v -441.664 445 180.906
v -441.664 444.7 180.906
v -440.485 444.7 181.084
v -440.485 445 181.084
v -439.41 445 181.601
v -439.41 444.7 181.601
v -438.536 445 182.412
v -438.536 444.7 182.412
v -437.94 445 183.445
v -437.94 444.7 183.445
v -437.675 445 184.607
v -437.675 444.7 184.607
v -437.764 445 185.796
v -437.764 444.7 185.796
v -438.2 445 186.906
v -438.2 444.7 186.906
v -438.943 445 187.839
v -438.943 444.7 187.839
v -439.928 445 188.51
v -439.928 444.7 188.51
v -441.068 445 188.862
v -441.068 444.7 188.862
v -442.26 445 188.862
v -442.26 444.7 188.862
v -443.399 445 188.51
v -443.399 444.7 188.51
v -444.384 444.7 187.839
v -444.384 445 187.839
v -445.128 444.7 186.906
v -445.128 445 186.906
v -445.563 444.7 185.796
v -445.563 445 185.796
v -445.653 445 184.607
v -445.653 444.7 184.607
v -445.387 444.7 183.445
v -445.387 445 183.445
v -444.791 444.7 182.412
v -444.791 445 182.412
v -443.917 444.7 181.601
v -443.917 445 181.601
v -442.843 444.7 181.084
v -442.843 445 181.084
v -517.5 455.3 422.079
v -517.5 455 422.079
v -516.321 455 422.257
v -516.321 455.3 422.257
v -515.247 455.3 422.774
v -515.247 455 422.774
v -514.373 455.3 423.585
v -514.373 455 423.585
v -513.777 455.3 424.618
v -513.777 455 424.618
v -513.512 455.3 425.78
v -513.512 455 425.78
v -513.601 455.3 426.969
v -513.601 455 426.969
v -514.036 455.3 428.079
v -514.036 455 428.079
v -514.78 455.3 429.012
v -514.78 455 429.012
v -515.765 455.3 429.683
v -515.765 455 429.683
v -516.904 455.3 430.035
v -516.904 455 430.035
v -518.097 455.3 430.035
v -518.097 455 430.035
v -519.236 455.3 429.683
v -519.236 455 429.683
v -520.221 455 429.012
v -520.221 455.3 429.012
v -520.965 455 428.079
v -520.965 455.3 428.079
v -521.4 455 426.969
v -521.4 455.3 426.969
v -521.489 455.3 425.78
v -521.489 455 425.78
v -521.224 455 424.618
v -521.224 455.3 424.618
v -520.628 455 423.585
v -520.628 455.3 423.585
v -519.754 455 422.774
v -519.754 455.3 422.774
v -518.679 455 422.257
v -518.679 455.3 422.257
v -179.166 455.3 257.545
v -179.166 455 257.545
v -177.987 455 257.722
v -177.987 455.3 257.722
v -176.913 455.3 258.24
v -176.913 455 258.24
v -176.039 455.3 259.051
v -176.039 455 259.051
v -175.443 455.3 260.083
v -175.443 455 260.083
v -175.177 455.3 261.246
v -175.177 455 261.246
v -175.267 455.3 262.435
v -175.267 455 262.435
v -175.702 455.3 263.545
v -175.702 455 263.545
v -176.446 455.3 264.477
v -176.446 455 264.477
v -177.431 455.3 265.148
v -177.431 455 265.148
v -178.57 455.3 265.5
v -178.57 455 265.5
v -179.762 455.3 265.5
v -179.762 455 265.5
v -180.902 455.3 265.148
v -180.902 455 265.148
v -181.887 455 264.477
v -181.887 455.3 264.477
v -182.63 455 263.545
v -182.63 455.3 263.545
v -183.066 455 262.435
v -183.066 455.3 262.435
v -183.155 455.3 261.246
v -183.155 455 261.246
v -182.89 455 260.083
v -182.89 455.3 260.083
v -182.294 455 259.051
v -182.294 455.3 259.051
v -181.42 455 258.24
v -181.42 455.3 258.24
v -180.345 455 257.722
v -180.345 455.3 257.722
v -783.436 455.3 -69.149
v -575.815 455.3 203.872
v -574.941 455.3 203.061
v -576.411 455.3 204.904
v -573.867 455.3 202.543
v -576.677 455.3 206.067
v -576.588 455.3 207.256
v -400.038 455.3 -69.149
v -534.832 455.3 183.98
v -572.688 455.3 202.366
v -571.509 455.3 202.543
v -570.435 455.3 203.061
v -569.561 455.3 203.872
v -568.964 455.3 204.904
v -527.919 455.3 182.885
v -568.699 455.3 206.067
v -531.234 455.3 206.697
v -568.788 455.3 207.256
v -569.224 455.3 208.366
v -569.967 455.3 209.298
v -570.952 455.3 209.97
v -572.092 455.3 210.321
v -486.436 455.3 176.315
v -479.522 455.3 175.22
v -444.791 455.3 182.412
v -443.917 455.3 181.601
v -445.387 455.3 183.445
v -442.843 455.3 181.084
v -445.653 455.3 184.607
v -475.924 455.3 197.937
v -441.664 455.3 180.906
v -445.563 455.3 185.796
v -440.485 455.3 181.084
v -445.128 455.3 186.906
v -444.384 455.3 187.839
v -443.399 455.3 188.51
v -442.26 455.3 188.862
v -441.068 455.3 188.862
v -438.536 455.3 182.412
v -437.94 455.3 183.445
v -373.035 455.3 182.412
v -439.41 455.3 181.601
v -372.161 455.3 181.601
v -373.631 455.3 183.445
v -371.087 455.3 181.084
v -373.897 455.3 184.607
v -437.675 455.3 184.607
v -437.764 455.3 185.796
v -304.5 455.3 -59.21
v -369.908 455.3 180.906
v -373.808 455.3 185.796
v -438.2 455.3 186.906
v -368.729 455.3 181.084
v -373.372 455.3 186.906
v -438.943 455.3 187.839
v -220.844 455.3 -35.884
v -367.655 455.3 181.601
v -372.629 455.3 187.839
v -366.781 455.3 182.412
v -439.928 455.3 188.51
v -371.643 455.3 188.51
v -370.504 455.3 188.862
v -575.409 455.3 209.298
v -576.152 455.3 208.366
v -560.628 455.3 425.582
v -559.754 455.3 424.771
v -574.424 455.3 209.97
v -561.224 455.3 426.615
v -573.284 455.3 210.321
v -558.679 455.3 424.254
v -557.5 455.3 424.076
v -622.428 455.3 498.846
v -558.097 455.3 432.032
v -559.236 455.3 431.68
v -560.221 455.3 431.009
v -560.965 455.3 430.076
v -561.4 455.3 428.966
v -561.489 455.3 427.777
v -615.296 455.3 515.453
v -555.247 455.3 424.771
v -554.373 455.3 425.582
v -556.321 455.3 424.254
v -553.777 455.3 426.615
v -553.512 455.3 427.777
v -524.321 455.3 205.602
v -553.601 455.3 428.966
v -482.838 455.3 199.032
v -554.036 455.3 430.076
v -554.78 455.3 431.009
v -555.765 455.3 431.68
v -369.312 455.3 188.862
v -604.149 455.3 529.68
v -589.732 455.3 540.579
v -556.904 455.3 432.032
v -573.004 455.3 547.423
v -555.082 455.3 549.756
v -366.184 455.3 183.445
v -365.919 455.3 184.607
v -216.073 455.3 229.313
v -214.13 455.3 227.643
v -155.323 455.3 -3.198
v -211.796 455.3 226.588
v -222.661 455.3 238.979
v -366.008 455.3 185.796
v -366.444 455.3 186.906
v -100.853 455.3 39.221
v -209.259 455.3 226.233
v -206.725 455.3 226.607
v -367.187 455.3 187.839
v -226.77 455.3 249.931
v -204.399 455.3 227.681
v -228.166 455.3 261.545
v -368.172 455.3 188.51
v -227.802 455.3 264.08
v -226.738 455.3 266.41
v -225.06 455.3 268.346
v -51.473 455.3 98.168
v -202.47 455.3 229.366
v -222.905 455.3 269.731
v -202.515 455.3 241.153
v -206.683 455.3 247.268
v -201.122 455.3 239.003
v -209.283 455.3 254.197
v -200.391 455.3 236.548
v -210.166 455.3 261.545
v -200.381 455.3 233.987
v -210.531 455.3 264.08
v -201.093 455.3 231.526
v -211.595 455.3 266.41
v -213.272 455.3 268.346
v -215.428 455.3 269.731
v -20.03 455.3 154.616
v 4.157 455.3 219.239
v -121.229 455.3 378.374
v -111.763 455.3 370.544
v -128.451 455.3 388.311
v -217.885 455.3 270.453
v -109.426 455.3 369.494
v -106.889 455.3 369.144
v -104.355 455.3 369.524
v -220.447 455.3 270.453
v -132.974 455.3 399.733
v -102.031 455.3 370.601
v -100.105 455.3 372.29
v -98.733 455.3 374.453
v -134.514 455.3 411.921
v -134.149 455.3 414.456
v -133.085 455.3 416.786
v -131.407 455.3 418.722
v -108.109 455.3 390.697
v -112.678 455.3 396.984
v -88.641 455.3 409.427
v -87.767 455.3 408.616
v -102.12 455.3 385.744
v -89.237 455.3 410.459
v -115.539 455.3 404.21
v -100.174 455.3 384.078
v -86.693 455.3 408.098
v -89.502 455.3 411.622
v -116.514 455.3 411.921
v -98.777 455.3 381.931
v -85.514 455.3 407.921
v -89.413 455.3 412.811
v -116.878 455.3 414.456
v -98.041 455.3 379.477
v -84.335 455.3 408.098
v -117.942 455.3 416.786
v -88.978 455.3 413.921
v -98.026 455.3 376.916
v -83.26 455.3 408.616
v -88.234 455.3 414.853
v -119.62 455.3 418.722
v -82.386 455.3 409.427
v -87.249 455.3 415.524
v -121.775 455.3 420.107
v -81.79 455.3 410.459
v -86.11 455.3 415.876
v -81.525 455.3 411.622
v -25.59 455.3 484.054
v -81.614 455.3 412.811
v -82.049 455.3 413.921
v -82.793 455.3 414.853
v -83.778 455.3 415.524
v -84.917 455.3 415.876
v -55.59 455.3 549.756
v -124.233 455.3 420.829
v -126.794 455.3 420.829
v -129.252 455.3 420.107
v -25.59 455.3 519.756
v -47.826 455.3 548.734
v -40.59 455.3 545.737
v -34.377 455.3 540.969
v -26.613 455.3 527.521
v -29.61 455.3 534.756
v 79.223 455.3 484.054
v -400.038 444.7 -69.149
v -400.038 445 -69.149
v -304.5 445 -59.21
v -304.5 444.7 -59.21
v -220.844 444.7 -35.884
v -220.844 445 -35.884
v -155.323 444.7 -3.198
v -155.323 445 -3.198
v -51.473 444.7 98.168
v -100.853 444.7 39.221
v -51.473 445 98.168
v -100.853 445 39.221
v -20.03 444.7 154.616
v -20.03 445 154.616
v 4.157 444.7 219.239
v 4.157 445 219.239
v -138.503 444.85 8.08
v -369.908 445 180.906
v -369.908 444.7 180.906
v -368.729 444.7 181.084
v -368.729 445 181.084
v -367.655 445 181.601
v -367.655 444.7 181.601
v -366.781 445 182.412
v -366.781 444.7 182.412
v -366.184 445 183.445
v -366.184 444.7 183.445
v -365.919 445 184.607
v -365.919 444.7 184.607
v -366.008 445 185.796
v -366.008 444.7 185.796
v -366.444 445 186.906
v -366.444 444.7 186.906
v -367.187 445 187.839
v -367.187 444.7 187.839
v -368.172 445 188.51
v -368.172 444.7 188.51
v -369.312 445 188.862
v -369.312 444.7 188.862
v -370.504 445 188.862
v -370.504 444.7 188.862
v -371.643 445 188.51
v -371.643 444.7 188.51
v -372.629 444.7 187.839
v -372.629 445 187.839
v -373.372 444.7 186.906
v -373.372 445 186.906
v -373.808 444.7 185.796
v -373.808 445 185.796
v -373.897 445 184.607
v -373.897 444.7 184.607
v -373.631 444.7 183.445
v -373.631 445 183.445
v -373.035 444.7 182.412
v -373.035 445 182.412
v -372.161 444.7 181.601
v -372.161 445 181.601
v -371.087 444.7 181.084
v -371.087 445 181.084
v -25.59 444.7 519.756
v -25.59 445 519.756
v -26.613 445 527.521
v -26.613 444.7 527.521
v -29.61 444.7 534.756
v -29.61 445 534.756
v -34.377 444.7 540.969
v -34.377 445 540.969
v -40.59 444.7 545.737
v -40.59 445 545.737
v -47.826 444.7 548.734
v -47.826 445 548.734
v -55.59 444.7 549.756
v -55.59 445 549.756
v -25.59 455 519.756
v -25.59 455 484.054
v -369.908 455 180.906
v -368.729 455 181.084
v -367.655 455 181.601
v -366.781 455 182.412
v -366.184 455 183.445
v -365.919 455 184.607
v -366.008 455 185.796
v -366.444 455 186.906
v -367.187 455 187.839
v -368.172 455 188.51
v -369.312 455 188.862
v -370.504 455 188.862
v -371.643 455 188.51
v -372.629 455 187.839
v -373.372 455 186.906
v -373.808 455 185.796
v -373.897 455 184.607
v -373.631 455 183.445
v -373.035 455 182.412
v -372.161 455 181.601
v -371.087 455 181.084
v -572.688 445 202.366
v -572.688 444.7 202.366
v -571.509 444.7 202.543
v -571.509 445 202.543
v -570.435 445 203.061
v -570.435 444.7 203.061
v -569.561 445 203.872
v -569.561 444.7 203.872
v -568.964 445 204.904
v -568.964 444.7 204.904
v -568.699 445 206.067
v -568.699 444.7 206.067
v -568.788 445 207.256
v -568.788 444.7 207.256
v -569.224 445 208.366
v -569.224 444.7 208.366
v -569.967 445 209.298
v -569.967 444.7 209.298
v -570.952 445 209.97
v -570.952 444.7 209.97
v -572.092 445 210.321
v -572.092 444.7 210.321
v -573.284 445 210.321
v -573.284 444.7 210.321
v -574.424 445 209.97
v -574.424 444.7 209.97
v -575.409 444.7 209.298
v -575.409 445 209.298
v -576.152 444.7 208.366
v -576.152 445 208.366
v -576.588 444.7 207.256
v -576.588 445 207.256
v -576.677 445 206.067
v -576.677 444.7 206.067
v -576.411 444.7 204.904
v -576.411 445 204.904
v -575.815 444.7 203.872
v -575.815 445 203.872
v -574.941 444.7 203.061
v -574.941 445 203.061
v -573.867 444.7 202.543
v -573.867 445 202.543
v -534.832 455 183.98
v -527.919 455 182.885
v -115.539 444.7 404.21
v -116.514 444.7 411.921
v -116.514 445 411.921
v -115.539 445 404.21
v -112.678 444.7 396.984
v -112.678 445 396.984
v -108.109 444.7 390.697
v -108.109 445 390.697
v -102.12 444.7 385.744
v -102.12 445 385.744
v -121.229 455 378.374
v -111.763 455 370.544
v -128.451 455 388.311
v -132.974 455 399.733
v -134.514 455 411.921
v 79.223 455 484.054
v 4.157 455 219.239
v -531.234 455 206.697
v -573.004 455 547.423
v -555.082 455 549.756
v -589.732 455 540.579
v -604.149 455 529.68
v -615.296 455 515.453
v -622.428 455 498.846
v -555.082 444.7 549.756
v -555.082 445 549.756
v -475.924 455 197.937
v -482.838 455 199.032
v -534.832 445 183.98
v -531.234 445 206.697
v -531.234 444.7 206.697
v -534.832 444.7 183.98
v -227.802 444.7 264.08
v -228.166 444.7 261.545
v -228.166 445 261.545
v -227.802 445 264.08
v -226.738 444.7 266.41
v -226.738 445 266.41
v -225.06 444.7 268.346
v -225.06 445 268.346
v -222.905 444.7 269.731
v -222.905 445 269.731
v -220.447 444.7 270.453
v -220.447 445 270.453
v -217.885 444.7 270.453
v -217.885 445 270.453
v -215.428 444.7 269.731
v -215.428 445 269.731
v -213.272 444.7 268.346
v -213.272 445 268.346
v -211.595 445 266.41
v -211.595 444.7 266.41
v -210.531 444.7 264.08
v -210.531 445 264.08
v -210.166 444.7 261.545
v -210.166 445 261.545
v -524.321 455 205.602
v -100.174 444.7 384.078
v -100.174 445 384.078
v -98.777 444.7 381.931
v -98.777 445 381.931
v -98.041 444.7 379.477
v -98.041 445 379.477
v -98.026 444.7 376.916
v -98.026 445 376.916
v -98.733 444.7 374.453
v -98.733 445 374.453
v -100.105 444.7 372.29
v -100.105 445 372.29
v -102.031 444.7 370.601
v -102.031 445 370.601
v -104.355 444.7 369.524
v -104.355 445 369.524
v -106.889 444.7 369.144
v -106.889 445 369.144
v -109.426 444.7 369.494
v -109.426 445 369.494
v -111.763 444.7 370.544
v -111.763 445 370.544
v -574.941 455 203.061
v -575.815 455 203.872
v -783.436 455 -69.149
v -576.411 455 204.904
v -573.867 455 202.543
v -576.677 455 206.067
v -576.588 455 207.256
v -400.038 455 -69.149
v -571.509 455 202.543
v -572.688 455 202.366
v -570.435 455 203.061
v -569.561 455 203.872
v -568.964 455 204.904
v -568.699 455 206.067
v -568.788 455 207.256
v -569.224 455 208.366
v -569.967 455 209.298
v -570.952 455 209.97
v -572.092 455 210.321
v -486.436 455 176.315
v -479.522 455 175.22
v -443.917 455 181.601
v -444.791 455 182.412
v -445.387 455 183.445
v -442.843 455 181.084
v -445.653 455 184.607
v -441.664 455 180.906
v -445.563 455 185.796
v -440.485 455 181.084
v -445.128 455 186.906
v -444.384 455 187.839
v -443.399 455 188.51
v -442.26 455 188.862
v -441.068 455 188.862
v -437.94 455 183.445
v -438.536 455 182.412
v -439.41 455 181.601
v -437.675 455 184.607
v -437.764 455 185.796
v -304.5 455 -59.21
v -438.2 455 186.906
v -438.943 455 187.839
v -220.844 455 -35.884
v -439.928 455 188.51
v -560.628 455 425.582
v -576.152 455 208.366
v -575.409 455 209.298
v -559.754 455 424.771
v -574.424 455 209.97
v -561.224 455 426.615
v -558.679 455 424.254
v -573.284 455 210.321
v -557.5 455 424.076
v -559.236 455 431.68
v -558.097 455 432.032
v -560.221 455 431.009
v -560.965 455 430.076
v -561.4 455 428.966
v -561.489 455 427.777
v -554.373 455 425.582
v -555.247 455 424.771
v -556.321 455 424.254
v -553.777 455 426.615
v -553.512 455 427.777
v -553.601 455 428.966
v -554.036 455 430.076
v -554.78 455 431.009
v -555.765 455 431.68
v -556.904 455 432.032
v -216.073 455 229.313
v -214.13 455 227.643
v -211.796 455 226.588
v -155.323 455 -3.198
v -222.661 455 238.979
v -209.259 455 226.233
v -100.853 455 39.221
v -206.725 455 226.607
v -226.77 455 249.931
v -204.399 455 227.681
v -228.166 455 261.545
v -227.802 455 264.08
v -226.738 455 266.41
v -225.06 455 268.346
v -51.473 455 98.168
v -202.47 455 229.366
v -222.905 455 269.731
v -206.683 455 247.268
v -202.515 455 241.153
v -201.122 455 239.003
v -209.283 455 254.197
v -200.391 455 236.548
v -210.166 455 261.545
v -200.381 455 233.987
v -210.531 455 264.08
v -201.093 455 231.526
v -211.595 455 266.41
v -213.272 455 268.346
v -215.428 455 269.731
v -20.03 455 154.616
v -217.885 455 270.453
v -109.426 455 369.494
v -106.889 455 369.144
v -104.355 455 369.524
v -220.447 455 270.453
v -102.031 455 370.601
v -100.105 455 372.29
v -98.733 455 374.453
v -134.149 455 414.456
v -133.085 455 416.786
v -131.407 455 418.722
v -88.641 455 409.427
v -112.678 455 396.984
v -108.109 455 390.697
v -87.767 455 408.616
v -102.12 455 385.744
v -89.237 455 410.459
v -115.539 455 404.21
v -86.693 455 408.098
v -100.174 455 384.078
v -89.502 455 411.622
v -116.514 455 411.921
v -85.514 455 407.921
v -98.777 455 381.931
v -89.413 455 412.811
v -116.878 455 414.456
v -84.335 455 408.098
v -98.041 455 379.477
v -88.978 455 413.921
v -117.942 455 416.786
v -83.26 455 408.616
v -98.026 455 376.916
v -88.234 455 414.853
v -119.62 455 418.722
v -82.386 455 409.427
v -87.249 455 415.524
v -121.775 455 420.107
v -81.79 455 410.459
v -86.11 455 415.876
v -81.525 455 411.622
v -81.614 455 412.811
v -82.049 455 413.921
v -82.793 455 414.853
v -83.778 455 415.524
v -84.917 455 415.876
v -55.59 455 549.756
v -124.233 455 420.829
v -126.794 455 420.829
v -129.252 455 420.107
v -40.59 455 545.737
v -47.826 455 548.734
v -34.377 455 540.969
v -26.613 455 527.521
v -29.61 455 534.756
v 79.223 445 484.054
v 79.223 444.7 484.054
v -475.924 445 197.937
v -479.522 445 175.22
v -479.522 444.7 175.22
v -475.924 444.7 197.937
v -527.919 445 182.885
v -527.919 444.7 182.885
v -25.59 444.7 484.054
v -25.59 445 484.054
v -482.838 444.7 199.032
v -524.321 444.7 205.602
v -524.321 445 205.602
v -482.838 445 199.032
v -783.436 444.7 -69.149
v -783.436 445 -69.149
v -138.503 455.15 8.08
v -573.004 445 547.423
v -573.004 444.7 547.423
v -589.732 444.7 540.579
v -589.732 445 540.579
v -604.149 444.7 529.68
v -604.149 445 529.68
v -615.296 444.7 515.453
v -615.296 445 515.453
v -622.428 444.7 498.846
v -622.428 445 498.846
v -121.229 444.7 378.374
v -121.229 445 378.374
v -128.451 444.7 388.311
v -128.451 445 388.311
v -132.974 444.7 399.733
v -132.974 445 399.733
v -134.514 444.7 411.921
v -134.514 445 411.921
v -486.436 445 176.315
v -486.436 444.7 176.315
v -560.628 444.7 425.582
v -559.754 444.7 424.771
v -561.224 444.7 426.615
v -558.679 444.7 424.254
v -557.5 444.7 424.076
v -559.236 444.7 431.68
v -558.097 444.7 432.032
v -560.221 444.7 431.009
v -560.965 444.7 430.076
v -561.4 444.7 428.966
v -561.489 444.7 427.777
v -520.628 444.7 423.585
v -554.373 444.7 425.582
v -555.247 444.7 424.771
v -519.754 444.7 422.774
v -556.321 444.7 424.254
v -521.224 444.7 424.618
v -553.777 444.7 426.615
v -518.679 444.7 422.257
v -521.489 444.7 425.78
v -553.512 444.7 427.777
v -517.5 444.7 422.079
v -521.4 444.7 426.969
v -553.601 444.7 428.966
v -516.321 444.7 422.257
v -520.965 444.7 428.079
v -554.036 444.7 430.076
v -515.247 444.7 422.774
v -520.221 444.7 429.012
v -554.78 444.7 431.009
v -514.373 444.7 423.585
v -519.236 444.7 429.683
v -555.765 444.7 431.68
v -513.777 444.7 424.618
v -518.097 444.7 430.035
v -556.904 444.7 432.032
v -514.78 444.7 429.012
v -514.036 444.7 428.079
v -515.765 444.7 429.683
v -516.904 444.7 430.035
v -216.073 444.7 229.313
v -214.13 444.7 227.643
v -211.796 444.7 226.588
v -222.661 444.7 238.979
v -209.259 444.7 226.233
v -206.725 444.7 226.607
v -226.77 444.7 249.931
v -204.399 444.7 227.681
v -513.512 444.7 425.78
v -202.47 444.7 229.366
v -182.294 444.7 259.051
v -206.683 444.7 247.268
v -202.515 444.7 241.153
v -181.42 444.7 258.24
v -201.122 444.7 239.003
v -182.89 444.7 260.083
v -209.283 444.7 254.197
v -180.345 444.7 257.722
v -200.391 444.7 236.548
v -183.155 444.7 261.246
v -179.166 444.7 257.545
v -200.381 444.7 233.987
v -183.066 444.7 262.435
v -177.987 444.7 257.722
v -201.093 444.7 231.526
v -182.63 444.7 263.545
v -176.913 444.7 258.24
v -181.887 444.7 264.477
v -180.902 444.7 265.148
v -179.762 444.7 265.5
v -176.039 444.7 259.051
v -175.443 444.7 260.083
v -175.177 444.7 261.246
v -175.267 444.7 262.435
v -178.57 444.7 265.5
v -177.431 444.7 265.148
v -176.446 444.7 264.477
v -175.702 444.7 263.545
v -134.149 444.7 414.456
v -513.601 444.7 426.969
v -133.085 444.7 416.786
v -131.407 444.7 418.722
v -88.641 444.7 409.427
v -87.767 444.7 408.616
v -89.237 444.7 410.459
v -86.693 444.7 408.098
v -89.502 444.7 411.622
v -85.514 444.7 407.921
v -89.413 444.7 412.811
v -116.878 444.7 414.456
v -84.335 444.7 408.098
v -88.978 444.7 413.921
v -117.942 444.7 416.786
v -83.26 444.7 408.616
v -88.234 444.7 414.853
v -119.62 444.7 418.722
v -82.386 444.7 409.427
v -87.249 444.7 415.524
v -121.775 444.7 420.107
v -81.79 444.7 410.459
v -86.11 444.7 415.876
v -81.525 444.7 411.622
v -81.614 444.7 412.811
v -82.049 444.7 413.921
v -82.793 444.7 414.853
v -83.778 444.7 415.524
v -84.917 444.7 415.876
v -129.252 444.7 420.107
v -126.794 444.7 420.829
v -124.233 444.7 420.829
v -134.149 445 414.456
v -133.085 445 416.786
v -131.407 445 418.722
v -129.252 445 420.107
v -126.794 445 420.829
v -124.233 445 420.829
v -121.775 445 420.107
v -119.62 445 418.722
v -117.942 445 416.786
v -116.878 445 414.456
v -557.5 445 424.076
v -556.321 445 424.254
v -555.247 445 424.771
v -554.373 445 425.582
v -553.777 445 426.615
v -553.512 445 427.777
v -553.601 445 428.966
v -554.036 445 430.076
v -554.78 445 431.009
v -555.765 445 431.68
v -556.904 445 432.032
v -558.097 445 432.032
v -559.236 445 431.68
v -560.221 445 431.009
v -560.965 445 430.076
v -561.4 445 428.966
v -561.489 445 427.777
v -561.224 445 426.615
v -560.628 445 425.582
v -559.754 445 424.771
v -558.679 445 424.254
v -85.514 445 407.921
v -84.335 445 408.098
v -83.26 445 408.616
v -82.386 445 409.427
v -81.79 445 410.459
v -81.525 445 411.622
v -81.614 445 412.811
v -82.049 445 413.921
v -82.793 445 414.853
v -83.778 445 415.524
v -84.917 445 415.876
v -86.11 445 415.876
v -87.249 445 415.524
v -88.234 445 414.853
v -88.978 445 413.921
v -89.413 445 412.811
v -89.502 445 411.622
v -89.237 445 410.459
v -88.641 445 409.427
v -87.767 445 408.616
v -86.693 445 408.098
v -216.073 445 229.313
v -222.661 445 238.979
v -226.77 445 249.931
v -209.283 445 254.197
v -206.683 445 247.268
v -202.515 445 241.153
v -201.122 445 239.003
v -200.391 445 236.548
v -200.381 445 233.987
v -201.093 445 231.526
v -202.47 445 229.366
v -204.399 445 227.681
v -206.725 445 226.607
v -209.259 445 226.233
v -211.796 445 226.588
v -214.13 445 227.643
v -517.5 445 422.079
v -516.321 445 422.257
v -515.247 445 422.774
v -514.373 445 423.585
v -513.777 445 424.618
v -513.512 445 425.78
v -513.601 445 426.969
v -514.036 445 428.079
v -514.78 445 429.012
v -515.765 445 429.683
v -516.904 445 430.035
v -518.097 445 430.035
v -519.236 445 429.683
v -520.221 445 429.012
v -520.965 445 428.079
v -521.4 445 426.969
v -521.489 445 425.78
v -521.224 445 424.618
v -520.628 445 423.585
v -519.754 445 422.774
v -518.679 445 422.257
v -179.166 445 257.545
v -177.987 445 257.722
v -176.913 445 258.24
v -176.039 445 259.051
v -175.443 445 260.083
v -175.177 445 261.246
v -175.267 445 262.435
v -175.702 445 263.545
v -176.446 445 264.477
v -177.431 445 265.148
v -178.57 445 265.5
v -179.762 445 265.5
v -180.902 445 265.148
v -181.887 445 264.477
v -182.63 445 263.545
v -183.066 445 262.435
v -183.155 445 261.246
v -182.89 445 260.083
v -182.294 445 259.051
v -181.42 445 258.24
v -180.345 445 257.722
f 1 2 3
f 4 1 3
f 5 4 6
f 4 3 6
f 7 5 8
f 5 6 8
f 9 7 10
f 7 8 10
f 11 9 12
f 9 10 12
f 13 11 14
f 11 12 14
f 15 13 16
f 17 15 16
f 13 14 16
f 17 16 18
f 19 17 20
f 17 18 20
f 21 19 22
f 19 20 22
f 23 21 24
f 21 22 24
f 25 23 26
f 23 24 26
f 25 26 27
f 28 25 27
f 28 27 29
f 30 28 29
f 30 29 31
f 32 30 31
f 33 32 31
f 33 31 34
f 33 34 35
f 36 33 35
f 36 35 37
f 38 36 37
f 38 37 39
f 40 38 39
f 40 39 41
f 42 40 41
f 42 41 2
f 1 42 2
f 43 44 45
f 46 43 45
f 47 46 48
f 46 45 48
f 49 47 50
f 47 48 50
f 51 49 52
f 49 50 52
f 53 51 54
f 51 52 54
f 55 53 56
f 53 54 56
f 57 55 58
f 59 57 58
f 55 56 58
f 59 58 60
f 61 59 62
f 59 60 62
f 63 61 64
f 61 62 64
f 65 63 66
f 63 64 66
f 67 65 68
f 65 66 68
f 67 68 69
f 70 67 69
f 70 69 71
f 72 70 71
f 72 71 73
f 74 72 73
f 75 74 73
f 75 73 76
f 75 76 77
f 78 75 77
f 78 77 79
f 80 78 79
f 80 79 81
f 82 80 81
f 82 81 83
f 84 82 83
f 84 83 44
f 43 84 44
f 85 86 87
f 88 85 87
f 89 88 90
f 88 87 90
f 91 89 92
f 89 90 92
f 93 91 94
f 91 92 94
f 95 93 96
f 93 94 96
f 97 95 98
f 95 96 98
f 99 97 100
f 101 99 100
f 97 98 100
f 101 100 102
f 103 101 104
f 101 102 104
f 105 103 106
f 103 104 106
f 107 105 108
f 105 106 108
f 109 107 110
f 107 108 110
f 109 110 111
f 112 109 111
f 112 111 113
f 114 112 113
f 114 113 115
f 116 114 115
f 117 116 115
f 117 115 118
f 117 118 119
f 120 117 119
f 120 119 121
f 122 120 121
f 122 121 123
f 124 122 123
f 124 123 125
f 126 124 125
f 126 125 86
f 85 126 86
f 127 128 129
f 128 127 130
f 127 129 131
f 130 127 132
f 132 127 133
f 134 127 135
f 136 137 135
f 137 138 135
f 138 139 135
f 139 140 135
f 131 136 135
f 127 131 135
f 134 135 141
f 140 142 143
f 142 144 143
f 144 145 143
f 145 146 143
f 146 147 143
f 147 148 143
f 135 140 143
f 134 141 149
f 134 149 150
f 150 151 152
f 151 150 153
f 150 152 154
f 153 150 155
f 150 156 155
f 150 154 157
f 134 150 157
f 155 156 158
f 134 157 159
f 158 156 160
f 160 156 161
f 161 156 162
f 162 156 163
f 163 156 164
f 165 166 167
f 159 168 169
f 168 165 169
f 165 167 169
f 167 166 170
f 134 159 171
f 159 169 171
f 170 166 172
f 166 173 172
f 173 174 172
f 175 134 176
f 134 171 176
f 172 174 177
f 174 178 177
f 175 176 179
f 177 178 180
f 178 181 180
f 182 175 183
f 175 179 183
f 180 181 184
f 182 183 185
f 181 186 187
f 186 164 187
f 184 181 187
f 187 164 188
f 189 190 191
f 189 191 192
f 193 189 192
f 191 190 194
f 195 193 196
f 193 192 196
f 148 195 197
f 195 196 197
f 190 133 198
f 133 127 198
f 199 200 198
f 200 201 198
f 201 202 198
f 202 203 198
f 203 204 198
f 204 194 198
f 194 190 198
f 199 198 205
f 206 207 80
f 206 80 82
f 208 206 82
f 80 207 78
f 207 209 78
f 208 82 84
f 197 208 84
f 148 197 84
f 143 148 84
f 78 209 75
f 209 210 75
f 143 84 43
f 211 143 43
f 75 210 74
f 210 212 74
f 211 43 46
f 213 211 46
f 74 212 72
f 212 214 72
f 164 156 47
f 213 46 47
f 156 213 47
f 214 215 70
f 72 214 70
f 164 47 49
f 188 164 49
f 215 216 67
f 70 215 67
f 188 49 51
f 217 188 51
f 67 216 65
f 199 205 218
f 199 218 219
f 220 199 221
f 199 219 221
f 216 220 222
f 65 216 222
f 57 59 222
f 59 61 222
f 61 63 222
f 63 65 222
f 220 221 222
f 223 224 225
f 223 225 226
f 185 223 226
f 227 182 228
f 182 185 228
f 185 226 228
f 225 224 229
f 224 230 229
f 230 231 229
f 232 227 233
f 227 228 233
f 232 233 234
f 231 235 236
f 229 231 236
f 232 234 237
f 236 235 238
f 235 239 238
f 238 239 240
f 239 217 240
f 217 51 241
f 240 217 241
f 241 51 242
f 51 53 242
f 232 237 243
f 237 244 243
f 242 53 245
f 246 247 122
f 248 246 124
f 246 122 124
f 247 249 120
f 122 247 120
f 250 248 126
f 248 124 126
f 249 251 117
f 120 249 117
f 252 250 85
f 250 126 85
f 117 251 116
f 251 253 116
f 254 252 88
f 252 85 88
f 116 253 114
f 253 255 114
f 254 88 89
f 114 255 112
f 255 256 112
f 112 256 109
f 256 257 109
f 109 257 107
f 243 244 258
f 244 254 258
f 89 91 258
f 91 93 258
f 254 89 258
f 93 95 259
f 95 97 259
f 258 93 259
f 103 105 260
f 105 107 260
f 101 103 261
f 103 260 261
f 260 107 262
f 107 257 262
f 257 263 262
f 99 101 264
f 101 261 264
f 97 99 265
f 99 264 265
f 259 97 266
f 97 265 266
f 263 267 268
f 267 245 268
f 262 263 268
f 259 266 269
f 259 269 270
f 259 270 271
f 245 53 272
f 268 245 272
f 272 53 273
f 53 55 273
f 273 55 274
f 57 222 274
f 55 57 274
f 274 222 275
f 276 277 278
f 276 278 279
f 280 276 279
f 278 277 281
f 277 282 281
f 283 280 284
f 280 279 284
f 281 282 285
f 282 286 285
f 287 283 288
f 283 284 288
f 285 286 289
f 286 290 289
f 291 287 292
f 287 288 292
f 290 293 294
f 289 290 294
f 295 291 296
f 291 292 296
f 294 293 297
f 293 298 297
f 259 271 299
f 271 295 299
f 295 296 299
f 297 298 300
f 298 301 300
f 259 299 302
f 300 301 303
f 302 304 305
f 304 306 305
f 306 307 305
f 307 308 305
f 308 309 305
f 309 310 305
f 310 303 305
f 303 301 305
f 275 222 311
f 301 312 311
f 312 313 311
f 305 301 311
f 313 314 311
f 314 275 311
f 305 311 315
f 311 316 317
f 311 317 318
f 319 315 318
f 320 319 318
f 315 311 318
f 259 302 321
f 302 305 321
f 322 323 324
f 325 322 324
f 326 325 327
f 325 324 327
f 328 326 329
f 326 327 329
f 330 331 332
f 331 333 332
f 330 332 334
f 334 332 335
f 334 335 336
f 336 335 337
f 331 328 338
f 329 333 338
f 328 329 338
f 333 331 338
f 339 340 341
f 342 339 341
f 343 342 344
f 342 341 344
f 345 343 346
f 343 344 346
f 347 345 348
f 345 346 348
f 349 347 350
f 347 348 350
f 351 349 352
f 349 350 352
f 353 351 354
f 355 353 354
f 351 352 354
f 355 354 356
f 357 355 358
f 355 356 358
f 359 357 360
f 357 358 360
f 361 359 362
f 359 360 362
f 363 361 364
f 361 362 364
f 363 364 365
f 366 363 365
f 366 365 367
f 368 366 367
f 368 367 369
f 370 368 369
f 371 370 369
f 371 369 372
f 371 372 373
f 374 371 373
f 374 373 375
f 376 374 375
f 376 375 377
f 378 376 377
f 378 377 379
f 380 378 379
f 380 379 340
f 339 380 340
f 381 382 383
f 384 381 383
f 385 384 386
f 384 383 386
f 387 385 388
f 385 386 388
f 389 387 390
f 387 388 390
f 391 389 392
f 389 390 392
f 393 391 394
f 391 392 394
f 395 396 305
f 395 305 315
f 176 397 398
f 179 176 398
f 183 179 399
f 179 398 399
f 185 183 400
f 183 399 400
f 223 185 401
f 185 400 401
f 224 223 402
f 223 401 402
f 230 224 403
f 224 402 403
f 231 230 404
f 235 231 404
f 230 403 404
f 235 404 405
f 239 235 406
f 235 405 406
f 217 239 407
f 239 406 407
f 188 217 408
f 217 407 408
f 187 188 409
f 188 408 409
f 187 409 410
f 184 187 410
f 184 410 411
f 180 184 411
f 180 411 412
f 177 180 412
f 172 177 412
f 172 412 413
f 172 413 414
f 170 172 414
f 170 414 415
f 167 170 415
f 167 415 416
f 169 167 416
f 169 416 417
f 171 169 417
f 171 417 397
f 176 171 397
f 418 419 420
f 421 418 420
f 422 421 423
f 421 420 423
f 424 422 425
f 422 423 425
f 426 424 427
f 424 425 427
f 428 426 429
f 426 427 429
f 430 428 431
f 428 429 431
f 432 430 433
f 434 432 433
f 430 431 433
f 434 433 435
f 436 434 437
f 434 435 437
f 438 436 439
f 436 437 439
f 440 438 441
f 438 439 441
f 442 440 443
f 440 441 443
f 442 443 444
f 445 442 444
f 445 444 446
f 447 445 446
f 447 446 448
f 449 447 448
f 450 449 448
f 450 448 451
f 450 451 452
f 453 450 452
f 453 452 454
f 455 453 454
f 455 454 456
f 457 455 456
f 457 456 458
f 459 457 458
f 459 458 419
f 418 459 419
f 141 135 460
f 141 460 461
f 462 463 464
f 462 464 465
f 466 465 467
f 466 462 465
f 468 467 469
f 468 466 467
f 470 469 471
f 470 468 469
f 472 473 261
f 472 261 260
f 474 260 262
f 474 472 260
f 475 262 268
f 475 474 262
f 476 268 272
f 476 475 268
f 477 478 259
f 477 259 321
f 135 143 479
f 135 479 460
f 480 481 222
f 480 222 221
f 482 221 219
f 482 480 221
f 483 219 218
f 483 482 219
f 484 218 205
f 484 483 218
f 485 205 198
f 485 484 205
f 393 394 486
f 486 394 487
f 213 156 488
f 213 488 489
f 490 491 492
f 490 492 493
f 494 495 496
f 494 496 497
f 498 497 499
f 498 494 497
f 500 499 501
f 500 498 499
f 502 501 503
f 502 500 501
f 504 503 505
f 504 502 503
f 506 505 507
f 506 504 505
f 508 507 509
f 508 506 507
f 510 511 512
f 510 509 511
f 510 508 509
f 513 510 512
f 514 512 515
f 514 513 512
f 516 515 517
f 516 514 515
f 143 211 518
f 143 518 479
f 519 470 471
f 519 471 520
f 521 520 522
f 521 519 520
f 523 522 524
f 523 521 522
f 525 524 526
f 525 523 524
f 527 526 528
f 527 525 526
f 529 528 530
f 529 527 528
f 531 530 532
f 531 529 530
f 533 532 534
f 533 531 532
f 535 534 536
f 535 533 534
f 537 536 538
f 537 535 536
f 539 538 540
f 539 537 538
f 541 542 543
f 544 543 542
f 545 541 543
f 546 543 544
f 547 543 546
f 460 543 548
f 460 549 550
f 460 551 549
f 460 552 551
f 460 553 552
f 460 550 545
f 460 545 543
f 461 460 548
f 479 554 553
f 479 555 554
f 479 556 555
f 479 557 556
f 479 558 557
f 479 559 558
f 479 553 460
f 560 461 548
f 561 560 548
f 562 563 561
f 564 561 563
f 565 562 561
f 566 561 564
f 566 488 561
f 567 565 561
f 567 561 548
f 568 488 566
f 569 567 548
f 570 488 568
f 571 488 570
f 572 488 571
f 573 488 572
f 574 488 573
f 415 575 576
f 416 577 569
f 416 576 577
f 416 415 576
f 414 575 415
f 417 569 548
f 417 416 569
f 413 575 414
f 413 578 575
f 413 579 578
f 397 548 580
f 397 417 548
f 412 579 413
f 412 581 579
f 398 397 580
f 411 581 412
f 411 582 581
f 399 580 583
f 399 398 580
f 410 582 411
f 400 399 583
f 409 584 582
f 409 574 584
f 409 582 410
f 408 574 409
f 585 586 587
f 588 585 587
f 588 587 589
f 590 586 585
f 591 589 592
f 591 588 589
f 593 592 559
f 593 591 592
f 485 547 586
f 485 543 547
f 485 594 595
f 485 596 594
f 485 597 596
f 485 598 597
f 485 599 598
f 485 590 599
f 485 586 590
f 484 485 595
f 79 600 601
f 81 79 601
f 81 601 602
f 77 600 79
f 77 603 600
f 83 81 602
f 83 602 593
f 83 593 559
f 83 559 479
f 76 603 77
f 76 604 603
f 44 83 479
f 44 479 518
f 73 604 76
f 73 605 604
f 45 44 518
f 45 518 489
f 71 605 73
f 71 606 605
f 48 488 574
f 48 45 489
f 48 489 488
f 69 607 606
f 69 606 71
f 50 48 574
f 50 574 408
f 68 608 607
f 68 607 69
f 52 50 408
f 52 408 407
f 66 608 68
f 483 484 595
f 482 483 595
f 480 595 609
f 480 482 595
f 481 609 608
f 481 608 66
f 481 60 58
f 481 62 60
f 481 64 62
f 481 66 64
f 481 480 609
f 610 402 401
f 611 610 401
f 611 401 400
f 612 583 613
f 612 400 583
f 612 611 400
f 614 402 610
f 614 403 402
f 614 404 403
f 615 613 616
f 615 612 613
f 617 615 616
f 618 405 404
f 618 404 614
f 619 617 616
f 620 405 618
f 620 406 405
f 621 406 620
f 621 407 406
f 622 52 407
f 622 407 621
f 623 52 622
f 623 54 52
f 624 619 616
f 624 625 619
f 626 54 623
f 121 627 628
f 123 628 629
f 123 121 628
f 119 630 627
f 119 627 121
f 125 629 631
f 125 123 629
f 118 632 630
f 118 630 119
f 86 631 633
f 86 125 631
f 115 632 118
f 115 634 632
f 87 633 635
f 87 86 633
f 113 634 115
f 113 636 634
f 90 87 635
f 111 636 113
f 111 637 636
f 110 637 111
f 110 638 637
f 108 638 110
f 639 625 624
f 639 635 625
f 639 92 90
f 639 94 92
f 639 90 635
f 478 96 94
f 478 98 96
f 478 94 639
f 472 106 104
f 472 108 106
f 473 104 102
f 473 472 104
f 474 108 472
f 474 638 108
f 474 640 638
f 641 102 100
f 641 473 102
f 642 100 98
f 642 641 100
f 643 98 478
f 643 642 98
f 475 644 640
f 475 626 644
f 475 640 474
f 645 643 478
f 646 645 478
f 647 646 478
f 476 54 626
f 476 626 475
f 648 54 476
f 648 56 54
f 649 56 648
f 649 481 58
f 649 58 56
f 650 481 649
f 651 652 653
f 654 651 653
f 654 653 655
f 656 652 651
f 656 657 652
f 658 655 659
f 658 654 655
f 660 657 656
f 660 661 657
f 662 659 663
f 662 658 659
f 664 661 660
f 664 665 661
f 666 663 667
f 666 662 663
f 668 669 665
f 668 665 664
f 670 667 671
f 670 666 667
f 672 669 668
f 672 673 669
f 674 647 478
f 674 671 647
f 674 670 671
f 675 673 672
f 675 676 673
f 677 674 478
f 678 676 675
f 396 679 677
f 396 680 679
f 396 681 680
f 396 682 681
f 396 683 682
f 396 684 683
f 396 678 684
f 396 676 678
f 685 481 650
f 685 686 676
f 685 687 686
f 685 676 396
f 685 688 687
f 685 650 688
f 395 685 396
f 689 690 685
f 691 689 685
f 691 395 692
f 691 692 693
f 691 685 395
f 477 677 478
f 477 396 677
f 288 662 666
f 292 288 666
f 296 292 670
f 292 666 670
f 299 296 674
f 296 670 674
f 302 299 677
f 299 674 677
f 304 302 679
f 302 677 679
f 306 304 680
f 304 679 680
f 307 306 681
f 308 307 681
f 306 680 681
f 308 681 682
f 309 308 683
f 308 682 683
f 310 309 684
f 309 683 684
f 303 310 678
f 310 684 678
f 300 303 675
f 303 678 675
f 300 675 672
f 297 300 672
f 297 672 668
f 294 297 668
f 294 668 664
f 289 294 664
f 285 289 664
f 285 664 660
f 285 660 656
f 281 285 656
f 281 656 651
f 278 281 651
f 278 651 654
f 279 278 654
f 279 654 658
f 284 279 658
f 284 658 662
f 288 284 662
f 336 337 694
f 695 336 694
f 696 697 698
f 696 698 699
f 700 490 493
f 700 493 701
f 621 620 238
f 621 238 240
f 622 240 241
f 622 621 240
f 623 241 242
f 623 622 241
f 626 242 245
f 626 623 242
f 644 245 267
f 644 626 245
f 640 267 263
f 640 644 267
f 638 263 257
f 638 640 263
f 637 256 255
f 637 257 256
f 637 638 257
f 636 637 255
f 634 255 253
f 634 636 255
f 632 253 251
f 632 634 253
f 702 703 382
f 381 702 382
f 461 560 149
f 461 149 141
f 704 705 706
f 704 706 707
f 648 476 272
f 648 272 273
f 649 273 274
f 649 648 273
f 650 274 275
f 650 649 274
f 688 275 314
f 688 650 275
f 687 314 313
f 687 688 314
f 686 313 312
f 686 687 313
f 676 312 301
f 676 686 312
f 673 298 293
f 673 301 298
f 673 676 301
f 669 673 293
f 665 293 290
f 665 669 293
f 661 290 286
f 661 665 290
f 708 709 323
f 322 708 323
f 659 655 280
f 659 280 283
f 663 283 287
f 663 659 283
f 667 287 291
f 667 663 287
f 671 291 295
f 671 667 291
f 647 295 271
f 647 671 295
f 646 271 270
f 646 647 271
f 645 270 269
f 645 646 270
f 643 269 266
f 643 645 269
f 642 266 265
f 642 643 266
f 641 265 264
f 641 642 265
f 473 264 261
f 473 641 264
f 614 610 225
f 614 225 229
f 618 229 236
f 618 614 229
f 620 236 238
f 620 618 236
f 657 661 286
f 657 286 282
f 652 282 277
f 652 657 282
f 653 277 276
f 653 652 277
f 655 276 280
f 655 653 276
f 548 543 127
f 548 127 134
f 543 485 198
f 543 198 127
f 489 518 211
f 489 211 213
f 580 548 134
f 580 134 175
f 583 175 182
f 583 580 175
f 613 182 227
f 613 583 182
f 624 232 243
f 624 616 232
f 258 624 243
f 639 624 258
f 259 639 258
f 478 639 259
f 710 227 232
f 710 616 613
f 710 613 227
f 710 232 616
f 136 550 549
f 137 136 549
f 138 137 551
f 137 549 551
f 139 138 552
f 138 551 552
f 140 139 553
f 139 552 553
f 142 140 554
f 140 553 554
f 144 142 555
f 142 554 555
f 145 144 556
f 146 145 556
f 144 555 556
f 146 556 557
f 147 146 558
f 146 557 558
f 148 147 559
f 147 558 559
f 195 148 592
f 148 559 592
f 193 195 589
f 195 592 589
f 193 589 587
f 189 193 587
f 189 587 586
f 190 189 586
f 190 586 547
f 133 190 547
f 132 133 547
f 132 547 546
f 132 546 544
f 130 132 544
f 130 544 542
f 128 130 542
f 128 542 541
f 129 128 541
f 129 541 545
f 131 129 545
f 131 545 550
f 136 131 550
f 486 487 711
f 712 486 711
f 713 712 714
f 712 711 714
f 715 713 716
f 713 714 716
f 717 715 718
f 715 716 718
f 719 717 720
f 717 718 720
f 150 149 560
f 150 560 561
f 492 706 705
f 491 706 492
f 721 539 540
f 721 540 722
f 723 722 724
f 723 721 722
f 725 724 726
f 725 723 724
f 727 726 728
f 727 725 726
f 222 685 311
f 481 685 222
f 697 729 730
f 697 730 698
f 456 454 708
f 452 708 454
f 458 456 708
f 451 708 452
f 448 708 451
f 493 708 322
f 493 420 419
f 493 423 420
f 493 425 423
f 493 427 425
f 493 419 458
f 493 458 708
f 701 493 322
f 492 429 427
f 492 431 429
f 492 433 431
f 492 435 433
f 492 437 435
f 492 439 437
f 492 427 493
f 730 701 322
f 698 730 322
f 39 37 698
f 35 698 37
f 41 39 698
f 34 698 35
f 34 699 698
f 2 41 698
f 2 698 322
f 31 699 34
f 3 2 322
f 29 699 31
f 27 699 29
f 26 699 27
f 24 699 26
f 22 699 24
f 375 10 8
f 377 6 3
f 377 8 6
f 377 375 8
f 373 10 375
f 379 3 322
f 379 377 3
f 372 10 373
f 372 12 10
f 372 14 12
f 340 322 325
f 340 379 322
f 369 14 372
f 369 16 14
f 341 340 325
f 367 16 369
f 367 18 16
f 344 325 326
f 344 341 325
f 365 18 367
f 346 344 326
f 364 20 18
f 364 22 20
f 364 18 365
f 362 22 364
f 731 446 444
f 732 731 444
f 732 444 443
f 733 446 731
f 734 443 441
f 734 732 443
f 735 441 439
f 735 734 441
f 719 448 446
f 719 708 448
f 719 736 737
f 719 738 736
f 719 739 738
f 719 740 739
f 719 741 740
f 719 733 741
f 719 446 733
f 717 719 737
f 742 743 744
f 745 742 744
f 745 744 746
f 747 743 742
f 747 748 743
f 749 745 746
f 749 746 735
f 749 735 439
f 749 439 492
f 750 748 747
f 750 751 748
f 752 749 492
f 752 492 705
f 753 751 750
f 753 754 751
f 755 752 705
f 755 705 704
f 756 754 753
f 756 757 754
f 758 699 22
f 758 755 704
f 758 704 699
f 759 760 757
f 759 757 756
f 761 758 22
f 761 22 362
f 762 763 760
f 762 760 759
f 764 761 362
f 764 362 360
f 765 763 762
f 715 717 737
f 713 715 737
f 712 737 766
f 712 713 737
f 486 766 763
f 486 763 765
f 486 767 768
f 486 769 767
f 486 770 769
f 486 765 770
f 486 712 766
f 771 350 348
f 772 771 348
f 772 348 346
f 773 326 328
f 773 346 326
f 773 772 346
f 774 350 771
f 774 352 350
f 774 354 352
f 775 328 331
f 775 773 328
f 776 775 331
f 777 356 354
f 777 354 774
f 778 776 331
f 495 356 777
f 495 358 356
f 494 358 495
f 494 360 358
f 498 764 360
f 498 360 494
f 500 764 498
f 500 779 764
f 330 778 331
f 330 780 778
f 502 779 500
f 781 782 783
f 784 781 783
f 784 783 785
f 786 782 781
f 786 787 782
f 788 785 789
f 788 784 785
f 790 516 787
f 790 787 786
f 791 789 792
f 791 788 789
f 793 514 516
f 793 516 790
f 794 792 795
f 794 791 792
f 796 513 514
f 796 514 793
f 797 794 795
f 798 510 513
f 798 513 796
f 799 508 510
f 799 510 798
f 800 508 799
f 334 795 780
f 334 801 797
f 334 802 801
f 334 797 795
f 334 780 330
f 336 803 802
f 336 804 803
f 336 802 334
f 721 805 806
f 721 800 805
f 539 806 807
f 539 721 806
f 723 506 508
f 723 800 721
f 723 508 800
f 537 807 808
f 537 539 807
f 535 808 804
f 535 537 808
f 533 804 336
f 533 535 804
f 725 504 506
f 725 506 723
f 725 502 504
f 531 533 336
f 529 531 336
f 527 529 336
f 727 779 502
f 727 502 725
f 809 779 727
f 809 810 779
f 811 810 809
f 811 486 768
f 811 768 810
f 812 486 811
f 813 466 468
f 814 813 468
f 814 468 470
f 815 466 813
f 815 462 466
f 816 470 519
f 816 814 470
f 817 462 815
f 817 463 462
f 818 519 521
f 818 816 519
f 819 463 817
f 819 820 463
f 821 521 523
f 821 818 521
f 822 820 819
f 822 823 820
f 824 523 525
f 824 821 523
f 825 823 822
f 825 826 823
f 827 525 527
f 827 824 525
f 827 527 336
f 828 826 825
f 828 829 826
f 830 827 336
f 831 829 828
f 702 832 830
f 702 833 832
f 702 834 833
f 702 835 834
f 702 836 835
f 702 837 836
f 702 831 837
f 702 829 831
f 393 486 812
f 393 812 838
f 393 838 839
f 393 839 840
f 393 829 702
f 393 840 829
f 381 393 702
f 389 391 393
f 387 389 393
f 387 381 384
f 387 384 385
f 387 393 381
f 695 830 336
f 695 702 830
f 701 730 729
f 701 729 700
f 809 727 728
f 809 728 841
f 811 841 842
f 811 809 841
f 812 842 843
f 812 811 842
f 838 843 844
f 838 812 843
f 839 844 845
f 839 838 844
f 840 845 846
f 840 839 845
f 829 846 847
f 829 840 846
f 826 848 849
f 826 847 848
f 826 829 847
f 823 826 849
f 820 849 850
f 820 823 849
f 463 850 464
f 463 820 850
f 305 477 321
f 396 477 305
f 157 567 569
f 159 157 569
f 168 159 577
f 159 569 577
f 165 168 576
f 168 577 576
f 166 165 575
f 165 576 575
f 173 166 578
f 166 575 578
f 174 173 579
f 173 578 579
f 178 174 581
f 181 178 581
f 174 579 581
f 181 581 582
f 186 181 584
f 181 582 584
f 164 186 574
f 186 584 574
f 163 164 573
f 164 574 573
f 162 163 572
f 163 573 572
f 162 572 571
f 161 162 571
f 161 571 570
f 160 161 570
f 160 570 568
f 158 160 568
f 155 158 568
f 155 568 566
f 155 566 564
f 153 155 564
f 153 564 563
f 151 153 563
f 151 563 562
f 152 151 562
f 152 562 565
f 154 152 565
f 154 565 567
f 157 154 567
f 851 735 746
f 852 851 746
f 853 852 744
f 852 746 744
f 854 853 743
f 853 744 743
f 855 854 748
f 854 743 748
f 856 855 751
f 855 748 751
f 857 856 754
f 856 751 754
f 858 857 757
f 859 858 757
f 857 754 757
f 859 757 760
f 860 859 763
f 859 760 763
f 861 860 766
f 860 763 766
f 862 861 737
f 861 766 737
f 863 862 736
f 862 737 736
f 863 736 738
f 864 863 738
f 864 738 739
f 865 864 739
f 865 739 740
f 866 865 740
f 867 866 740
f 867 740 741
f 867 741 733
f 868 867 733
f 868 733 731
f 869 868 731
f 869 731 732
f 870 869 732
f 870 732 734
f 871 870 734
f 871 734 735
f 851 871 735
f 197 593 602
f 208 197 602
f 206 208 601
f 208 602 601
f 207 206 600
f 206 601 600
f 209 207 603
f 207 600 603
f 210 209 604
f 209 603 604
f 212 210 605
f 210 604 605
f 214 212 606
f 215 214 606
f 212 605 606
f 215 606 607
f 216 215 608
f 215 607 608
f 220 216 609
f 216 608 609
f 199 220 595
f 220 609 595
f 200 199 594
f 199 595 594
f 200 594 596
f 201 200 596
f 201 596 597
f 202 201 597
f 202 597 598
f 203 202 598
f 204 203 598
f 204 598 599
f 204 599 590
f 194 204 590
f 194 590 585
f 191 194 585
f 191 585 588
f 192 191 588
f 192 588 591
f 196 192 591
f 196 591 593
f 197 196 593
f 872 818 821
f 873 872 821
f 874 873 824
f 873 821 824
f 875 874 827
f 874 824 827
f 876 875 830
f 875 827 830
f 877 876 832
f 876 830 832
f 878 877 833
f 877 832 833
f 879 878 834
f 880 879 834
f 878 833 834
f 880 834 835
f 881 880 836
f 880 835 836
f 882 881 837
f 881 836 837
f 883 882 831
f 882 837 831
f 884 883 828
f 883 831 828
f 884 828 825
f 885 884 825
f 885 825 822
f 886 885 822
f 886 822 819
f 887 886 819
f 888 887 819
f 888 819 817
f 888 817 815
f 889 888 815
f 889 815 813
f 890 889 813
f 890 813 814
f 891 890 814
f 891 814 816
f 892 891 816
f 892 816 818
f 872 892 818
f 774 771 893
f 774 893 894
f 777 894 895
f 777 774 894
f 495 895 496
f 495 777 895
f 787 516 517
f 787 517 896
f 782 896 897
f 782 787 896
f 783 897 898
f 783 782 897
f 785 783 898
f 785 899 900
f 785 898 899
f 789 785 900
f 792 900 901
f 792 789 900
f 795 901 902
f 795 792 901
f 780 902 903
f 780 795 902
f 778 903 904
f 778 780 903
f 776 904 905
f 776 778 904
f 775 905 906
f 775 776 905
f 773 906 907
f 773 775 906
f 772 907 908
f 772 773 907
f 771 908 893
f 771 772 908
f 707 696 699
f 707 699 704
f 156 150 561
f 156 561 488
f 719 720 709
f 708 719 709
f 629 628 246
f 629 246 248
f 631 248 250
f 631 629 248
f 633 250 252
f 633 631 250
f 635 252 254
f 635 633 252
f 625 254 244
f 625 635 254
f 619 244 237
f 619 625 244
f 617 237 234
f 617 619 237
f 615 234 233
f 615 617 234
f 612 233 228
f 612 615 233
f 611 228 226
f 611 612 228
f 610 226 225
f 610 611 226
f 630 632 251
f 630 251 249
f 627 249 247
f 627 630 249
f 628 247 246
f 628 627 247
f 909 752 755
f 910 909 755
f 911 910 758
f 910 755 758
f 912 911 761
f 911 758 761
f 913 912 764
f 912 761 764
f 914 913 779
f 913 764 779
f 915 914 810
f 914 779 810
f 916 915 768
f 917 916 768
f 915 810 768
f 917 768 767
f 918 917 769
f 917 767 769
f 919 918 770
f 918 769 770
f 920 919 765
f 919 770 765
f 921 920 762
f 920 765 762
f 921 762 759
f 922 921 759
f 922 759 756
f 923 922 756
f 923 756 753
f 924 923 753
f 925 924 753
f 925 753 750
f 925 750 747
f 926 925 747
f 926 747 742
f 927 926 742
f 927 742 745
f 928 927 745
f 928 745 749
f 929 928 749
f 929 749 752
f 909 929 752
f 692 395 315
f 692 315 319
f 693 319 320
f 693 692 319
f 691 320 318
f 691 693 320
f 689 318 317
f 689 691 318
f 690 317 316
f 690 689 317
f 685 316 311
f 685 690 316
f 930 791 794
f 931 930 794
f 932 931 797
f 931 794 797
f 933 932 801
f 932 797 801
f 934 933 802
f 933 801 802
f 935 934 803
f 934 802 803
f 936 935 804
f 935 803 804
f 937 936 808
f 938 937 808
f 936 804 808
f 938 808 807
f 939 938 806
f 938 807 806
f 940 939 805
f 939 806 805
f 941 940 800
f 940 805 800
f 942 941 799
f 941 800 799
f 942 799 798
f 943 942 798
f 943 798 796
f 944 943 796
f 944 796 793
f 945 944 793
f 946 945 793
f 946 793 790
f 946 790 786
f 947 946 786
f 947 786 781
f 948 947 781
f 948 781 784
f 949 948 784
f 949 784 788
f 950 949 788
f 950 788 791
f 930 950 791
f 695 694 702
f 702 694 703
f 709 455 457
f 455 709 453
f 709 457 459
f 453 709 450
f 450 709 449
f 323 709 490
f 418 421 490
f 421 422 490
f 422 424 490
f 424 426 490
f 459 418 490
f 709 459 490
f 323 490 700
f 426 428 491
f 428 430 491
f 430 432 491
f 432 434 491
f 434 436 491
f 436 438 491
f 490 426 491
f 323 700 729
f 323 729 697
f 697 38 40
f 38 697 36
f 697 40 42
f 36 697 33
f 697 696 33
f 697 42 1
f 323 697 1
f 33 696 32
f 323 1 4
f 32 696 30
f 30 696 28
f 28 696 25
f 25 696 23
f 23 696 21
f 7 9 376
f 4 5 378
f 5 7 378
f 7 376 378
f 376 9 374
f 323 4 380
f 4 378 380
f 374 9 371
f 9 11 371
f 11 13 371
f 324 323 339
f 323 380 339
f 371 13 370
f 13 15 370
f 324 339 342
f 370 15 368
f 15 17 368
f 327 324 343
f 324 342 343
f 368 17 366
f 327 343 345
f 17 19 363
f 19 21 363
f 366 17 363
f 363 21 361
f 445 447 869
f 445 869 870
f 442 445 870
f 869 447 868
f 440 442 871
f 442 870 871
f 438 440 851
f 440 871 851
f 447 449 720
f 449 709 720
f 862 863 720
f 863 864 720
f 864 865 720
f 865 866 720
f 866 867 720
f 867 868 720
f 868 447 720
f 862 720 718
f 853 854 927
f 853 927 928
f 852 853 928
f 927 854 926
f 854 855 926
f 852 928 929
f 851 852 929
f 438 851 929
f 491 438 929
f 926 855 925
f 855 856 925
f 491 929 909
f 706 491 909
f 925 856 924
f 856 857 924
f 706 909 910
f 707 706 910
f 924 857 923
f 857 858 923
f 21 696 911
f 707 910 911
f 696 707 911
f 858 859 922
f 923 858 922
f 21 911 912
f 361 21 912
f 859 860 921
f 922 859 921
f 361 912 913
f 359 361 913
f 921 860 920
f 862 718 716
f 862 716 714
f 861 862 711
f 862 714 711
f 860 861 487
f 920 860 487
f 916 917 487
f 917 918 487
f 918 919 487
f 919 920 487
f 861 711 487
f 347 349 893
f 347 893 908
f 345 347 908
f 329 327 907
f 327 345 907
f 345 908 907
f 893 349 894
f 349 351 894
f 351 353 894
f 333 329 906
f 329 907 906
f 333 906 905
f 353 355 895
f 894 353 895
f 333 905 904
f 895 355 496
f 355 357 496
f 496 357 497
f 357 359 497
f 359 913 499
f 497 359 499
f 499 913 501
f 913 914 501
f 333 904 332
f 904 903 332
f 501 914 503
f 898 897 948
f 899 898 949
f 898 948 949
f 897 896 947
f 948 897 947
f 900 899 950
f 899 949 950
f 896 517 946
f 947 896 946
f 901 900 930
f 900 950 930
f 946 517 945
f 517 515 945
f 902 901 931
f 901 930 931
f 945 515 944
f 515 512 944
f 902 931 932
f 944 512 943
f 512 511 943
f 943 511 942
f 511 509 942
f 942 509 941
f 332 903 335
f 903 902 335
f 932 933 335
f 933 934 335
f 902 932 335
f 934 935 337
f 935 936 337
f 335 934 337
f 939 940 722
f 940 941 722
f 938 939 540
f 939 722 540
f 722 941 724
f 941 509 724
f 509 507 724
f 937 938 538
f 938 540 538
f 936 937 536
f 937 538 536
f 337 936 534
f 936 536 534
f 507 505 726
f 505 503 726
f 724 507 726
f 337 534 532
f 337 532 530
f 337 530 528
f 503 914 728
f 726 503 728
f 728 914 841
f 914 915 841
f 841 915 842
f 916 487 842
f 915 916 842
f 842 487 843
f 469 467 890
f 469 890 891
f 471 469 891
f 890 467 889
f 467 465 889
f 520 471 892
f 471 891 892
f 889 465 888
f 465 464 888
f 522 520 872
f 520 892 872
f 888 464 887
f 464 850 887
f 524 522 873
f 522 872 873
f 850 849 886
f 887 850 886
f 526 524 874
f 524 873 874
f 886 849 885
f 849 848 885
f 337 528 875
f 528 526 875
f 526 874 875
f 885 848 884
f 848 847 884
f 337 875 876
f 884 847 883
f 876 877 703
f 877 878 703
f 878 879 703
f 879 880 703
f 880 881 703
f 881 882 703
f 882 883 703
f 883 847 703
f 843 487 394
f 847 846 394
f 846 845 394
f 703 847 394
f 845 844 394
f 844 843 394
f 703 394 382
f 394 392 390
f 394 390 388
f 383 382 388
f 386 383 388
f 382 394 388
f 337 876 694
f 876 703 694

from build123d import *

# Parameters (mm, degrees)
DODANIE_WYCI_GNI_CIE1_DEPTH = 0.3
SZKIC3_R                    = 4
WYTNIJ_WYCI_GNI_CIE1_DEPTH  = 40
WYTNIJ_WYCI_GNI_CIE2_DEPTH  = 958.139765163


with BuildPart() as part:
    # Szkic1 → Dodanie-wyciągnięcie1 (new body)
    with BuildSketch(Plane.XZ.offset(-445)):
        with BuildLine():
            Line((-783.436356075, -69.14931872), (-400.038066875, -69.14931873))
            add(Edge.make_bspline(
                [(-400.038066875, -69.14931873), (-79.065173683, -58.88529232), (4.157071393, 219.238816637)],
                knots=[0, 0, 0, 1, 1, 1], degree=2))
            Line((4.157071393, 219.238816637), (79.223413624, 484.054193396))
            Line((79.223413624, 484.054193396), (-25.590426412, 484.054193396))
            Line((-25.590426412, 484.054193396), (-25.590426412, 519.755987478))
            ThreePointArc((-25.590426412, 519.755987478), (-34.377222976, 540.969190913), (-55.590426412, 549.755987478))
            Line((-55.590426412, 549.755987478), (-555.081943572, 549.755987478))
            ThreePointArc((-555.081943572, 549.755987478), (-597.293703671, 535.596540029), (-622.42845809, 498.846482029))
            Line((-622.42845809, 498.846482029), (-783.436356075, -69.14931872))
        make_face()
    extrude(amount=DODANIE_WYCI_GNI_CIE1_DEPTH)


with BuildPart() as body_2:
    # Lustro2: mirrored copy
    add(part.part.mirror(Plane.ZX.offset(450)))


with BuildPart() as wytnij_wyci_gni_cie1_tool:
    # Szkic3 → Wytnij-wyciągnięcie1 (new body)
    with BuildSketch(Plane.XZ.offset(-444.7)):
        with Locations(Location((-572.687982615, 206.365683115, 0), (0, 0, 270))):
            Circle(SZKIC3_R)
        with Locations(Location((-441.66371711, 184.906368669, 0), (0, 0, 270))):
            Circle(SZKIC3_R)
        with Locations(Location((-369.907883248, 184.906368669, 0), (0, 0, 270))):
            Circle(SZKIC3_R)
        with Locations(Location((-557.500474948, 428.076305614, 0), (0, 0, 270))):
            Circle(SZKIC3_R)
        with Locations(Location((-517.500474948, 426.079306347, 0), (0, 0, 270))):
            Circle(SZKIC3_R)
        with Locations(Location((-179.166238959, 261.544556892, 0), (0, 0, 270))):
            Circle(SZKIC3_R)
        with Locations(Location((-85.513533731, 411.920534849, 0), (0, 0, 270))):
            Circle(SZKIC3_R)
        Polygon((-524.320658323, 205.601886031), (-482.837748018, 199.031638499), (-486.435740714, 176.314806666), (-527.918651019, 182.885054197), align=None)
        with BuildLine():
            ThreePointArc((-116.513533731, 411.920534849), (-112.677886877, 396.984072143), (-102.120119655, 385.743802739))
            ThreePointArc((-102.120119655, 385.743802739), (-99.341690118, 373.322839439), (-111.762653418, 370.544409902))
            ThreePointArc((-111.762653418, 370.544409902), (-128.45073709, 388.311287346), (-134.513533731, 411.920534849))
            ThreePointArc((-134.513533731, 411.920534849), (-125.513533731, 420.920534849), (-116.513533731, 411.920534849))
        make_face()
        with BuildLine():
            ThreePointArc((-210.166238959, 261.544556892), (-208.190571246, 250.654738927), (-202.51539152, 241.152963656))
            ThreePointArc((-202.51539152, 241.152963656), (-203.374037775, 228.454037457), (-216.072963974, 229.312683713))
            ThreePointArc((-216.072963974, 229.312683713), (-225.043409348, 244.331618818), (-228.166238959, 261.544556892))
            ThreePointArc((-228.166238959, 261.544556892), (-219.166238959, 270.544556892), (-210.166238959, 261.544556892))
        make_face()
    extrude(amount=-WYTNIJ_WYCI_GNI_CIE1_DEPTH)


with BuildPart() as part_1:
    add(part.part)

    # Wytnij-wyciągnięcie1: cut by wytnij_wyci_gni_cie1_tool
    add(wytnij_wyci_gni_cie1_tool.part, mode=Mode.SUBTRACT)


with BuildPart() as body_2_1:
    add(body_2.part)

    # Wytnij-wyciągnięcie1: cut by wytnij_wyci_gni_cie1_tool
    add(wytnij_wyci_gni_cie1_tool.part, mode=Mode.SUBTRACT)


with BuildPart() as wytnij_wyci_gni_cie2_tool:
    # Szkic4 → Wytnij-wyciągnięcie2 (new, through all)
    with BuildSketch(Plane(origin=(0, 455.3, 0), x_dir=(1, 0, 0), z_dir=(0, 1, 0))):
        Polygon((-527.918651019, -182.885054197), (-486.435740714, -176.314806666), (-479.52192233, -175.21976541), (-475.923929634, -197.936597244), (-482.837748018, -199.031638499), (-531.234476707, -206.696927286), (-534.832469403, -183.980095453), align=None)
    extrude(amount=-WYTNIJ_WYCI_GNI_CIE2_DEPTH)


with BuildPart() as part_2:
    add(part_1.part)

    # Wytnij-wyciągnięcie2: cut by wytnij_wyci_gni_cie2_tool
    add(wytnij_wyci_gni_cie2_tool.part, mode=Mode.SUBTRACT)


with BuildPart() as body_2_2:
    add(body_2_1.part)

    # Wytnij-wyciągnięcie2: cut by wytnij_wyci_gni_cie2_tool
    add(wytnij_wyci_gni_cie2_tool.part, mode=Mode.SUBTRACT)


solid = Compound([part_2.part, body_2_2.part])
